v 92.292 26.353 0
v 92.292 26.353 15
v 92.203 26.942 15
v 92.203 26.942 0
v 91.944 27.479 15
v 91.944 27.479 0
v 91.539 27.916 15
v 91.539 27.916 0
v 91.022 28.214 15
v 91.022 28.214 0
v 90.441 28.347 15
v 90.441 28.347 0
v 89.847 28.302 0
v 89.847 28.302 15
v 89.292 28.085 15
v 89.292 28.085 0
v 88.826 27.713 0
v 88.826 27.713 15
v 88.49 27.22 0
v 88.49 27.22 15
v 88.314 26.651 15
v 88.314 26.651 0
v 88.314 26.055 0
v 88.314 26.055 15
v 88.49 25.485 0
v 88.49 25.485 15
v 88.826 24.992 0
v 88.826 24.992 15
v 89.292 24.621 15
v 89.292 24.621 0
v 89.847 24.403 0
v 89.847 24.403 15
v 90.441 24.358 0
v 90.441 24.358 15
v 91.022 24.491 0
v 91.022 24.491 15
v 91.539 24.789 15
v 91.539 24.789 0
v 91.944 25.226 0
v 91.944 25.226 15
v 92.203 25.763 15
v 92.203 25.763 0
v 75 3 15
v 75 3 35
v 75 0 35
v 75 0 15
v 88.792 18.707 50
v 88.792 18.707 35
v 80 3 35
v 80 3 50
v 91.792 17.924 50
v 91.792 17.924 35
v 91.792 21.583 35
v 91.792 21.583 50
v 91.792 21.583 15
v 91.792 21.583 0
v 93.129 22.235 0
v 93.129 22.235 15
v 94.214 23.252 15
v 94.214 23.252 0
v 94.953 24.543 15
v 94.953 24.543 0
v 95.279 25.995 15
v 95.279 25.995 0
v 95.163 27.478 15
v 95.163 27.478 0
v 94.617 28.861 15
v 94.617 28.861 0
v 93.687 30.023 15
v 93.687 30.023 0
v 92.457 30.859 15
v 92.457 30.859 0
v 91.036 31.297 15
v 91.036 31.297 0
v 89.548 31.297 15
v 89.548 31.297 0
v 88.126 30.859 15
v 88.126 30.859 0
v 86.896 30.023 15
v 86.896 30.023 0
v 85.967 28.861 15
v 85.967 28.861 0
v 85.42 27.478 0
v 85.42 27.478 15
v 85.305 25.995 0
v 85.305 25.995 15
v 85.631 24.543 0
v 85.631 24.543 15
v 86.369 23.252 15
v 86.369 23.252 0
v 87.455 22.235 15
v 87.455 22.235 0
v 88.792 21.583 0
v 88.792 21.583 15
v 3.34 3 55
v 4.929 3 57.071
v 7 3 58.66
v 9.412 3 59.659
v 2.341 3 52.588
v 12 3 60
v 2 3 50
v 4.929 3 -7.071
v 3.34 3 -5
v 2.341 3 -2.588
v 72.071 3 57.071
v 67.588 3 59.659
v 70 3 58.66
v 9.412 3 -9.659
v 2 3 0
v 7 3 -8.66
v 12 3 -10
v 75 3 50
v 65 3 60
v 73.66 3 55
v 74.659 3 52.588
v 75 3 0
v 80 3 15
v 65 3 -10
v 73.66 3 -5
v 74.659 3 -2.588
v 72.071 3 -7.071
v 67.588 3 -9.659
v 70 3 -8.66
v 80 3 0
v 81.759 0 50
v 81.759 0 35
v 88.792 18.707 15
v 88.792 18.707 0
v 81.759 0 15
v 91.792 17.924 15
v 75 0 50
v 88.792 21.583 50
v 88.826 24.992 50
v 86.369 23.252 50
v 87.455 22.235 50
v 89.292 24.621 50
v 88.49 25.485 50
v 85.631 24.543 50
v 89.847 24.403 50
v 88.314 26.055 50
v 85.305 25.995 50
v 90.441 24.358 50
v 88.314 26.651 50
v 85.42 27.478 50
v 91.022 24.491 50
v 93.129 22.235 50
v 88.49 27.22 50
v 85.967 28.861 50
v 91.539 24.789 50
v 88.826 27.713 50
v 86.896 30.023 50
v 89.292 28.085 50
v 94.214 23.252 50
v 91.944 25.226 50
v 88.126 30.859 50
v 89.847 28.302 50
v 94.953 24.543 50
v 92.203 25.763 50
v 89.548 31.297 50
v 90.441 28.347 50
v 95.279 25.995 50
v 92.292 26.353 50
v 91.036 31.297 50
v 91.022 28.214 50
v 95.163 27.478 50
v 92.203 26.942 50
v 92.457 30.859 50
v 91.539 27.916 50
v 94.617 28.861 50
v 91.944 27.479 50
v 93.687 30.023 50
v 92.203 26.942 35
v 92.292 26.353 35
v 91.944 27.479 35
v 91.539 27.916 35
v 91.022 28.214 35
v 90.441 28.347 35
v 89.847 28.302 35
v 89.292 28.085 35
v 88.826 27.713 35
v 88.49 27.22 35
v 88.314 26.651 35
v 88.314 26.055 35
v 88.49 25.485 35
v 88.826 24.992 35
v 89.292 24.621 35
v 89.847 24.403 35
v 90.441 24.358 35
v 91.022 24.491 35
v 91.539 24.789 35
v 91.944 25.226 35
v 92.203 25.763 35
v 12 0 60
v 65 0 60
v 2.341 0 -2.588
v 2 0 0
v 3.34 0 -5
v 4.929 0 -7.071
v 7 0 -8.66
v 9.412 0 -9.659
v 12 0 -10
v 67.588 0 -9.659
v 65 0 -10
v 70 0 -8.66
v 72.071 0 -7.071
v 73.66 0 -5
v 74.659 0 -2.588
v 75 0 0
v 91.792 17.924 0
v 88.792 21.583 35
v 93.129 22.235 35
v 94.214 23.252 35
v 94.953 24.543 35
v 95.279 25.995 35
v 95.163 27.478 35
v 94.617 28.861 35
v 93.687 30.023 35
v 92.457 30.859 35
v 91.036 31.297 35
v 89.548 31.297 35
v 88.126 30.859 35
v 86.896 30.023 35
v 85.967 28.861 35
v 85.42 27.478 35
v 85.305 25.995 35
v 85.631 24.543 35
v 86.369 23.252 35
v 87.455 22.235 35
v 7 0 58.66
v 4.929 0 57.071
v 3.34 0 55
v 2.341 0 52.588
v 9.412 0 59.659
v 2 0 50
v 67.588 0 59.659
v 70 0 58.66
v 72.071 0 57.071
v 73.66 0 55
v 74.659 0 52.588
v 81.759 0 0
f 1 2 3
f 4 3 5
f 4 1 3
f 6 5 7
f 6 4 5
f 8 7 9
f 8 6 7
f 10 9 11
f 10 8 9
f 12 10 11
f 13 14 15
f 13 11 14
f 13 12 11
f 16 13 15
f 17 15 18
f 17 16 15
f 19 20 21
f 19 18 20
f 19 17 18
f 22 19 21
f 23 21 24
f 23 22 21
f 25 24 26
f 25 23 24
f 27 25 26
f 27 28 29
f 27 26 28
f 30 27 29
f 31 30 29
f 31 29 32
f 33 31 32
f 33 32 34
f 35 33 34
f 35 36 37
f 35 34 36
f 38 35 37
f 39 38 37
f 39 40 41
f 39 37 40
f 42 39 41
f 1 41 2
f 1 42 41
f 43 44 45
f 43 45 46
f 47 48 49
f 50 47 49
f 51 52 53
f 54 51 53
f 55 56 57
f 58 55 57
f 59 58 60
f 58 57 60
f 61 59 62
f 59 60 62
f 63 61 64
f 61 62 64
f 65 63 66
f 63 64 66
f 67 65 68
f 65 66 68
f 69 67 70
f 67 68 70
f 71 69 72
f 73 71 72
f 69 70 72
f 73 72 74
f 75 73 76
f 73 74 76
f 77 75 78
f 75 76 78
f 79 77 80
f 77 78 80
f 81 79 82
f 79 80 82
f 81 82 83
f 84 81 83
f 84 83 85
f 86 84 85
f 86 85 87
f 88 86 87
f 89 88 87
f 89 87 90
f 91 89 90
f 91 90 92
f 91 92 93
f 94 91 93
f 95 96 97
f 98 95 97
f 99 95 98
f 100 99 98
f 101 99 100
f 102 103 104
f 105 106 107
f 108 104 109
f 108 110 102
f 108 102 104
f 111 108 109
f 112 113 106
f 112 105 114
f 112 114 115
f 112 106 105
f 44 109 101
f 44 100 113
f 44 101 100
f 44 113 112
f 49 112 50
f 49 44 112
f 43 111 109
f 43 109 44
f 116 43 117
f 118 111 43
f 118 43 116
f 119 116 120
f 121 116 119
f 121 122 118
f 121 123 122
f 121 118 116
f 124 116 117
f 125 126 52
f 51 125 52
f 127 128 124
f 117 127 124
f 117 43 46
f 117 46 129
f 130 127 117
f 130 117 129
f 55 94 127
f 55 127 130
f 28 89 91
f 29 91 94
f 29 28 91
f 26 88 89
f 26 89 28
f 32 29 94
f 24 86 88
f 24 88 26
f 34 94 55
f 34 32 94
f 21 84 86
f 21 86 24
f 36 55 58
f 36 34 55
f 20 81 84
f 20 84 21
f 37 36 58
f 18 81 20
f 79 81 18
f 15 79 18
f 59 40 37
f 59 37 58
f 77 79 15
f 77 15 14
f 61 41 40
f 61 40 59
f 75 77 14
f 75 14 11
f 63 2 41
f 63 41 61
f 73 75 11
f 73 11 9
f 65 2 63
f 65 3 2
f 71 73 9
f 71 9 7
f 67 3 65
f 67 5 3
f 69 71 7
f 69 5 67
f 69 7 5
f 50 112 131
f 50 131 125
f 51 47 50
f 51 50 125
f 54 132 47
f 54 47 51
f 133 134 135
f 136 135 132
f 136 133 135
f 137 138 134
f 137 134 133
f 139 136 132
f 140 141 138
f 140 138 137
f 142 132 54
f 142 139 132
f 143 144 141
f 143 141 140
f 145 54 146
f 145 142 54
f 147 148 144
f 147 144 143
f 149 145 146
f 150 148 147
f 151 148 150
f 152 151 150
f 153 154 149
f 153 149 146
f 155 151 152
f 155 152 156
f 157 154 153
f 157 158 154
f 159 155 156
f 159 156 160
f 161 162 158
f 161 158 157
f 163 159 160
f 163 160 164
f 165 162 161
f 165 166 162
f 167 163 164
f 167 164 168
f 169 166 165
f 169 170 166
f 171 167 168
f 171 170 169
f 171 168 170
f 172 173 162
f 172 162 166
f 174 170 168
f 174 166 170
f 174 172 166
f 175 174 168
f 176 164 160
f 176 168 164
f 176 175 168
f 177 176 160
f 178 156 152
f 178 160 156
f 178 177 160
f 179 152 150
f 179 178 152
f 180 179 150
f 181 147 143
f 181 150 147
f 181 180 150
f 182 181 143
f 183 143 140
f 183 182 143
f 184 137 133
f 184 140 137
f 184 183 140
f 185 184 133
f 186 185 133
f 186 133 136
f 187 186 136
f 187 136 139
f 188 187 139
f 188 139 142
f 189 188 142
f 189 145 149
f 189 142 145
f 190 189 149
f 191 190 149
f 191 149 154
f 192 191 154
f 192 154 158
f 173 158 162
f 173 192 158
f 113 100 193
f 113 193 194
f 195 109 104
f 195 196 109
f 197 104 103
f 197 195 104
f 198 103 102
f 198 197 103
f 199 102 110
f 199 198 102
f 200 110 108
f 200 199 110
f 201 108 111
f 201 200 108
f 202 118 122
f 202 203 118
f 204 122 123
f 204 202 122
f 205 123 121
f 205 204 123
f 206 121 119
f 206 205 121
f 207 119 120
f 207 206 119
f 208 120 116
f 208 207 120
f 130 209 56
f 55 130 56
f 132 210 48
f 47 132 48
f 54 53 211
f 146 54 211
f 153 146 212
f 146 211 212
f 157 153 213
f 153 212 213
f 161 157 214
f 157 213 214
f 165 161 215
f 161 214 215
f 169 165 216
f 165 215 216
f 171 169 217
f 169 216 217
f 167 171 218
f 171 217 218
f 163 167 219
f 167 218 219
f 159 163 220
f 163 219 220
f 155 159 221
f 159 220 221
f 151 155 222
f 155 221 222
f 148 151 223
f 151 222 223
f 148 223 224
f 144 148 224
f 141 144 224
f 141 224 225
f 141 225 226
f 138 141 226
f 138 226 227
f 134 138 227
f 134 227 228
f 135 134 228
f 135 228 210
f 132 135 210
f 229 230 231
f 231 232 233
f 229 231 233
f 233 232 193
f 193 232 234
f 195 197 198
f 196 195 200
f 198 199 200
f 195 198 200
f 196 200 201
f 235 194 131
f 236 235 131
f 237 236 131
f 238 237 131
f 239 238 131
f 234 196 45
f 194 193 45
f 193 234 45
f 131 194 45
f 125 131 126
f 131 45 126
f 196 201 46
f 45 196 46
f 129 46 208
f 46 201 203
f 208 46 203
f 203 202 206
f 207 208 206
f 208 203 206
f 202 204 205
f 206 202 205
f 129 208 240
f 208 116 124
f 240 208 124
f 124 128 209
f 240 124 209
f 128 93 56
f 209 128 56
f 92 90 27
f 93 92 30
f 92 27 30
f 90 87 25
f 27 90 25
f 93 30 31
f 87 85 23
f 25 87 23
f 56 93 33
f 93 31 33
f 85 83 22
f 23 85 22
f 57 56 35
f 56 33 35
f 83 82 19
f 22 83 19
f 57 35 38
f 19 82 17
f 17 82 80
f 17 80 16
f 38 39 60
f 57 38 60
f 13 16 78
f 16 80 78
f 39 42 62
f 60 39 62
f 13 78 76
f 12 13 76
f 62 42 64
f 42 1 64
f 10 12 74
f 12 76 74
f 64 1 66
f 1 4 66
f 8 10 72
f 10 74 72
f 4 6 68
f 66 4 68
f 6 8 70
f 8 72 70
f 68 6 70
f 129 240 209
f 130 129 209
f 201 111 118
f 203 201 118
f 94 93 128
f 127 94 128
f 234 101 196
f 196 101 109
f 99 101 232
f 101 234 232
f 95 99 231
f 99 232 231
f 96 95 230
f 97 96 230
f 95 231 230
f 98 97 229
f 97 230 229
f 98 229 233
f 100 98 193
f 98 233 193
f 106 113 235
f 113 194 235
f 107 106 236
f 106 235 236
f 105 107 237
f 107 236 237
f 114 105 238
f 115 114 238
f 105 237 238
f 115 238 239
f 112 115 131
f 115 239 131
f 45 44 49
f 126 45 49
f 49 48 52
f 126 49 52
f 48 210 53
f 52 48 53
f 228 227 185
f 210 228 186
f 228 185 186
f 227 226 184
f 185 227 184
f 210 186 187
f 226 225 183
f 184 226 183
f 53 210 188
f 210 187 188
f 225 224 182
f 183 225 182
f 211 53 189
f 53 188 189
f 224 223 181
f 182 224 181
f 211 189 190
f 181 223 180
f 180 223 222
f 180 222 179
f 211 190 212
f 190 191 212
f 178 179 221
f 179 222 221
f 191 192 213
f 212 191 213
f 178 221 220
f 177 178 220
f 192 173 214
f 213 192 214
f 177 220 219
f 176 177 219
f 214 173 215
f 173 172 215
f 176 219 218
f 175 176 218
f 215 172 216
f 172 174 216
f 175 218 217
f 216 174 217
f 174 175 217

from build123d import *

# Parameters (mm, degrees)
SKETCH1_R               = 5
BOSS_EXTRUDE1_DEPTH     = 50
SKETCH2_R               = 2
CUT_EXTRUDE1_DEPTH      = 113.087037288
CUT_EXTRUDE3_DEPTH      = 10
CUT_EXTRUDE3_DEPTH_BACK = 10
SKETCH7_W               = 20
SKETCH7_H               = 39.987182744
BOSS_EXTRUDE2_REACH     = 114.087
CUT_EXTRUDE4_REACH      = 114.087
SKETCH9_W               = 20
SKETCH9_H               = 10.896319728
CUT_EXTRUDE6_REACH      = 114.087
SKETCH11_W              = 5
SKETCH11_H              = 3
SKETCH12_W              = 73
SKETCH12_H              = 70
BOSS_EXTRUDE3_DEPTH     = 3
SKETCH13_W              = 6.758772051
SKETCH13_H              = 20
CUT_EXTRUDE7_DEPTH      = 117.122297969
FILLET1_R               = 10


with BuildPart() as part:
    # Sketch1 → Boss-Extrude1 (new body)
    with BuildSketch(Plane.XY):
        with Locations((90.291740814, 26.352640412)):
            Circle(SKETCH1_R)
        Polygon((0, 3), (0, 0), (81.758772051, 0), (91.791740814, 17.924366601), (91.791740814, 23.706854983), (88.791740814, 23.706854983), (88.791740814, 18.706854983), (80, 3), align=None)
    extrude(amount=BOSS_EXTRUDE1_DEPTH)

    # Sketch2 → Cut-Extrude1 (cut, through all)
    with BuildSketch(Plane.XY):
        with Locations((90.291740814, 26.352640412)):
            Circle(SKETCH2_R)
    extrude(amount=CUT_EXTRUDE1_DEPTH, mode=Mode.SUBTRACT)

    # Sketch7 → Cut-Extrude3 (cut, two sides: drawn at the far end of the back side and taken through both)
    with BuildSketch(Plane(origin=(62.254079791, -34.846042362, 0), x_dir=(0, 0, -1), z_dir=(0.8726030546274219, -0.4884300452008377, 0)).offset(-CUT_EXTRUDE3_DEPTH_BACK)):
        with Locations((-25, 59.927032101)):
            Rectangle(SKETCH7_W, SKETCH7_H)
    extrude(amount=CUT_EXTRUDE3_DEPTH + CUT_EXTRUDE3_DEPTH_BACK, mode=Mode.SUBTRACT)

    # Sketch8 → Boss-Extrude2 (add, up to next)
    with BuildSketch(Plane.XY, mode=Mode.PRIVATE) as boss_extrude2_sk1:
        Polygon((66.951015515, 3), (66.951015515, 0), (81.758772051, 0), (79.25400484, 1.667244856), (80, 3), align=None)
    boss_extrude2_tool1 = extrude(boss_extrude2_sk1.sketch, amount=BOSS_EXTRUDE2_REACH, mode=Mode.PRIVATE) - part.part
    add(boss_extrude2_tool1.solids().sort_by_distance((73.552437, 1.463367, 0))[0])

    # Sketch9 → Cut-Extrude4 (cut, up to next)
    with BuildSketch(Plane(origin=(0, 0, 0), x_dir=(0, 0, -1), z_dir=(1, 0, 0)), mode=Mode.PRIVATE) as cut_extrude4_sk1:
        with Locations((-25, 32.01270193)):
            Rectangle(SKETCH9_W, SKETCH9_H)
    cut_extrude4_tool1 = extrude(cut_extrude4_sk1.sketch, amount=CUT_EXTRUDE4_REACH, mode=Mode.PRIVATE) & part.part
    add(cut_extrude4_tool1.solids().sort_by_distance((0, 32.012702, 25))[0], mode=Mode.SUBTRACT)

    # Sketch11 → Cut-Extrude6 (cut, up to next)
    with BuildSketch(Plane.XY.offset(50), mode=Mode.PRIVATE) as cut_extrude6_sk1:
        with Locations((2.5, 1.5)):
            Rectangle(SKETCH11_W, SKETCH11_H)
    cut_extrude6_tool1 = extrude(cut_extrude6_sk1.sketch, amount=-CUT_EXTRUDE6_REACH, mode=Mode.PRIVATE) & part.part
    add(cut_extrude6_tool1.solids().sort_by_distance((2.5, 1.5, 50))[0], mode=Mode.SUBTRACT)

    # Sketch12 → Boss-Extrude3 (add, through all)
    with BuildSketch(Plane(origin=(0, 3, 0), x_dir=(1, 0, 0), z_dir=(0, 1, 0))):
        with Locations((38.5, -25)):
            Rectangle(SKETCH12_W, SKETCH12_H)
    extrude(amount=-BOSS_EXTRUDE3_DEPTH)

    # Sketch13 → Cut-Extrude7 (cut, through all)
    with BuildSketch(Plane(origin=(0, 3, 0), x_dir=(1, 0, 0), z_dir=(0, 1, 0))):
        with Locations((78.379386025, -25)):
            Rectangle(SKETCH13_W, SKETCH13_H)
    extrude(amount=-CUT_EXTRUDE7_DEPTH, mode=Mode.SUBTRACT)

    # Fillet1
    fillet1_edges = [part.edges().sort_by_distance(p)[0] for p in [
        (75, 1.5, -10),
        (2, 1.5, -10),
        (2, 1.5, 60),
        (75, 1.5, 60),
    ]]
    fillet(fillet1_edges, radius=FILLET1_R - 0.0001)  # a hair under: the kernel refuses the full size


solid = part.part
